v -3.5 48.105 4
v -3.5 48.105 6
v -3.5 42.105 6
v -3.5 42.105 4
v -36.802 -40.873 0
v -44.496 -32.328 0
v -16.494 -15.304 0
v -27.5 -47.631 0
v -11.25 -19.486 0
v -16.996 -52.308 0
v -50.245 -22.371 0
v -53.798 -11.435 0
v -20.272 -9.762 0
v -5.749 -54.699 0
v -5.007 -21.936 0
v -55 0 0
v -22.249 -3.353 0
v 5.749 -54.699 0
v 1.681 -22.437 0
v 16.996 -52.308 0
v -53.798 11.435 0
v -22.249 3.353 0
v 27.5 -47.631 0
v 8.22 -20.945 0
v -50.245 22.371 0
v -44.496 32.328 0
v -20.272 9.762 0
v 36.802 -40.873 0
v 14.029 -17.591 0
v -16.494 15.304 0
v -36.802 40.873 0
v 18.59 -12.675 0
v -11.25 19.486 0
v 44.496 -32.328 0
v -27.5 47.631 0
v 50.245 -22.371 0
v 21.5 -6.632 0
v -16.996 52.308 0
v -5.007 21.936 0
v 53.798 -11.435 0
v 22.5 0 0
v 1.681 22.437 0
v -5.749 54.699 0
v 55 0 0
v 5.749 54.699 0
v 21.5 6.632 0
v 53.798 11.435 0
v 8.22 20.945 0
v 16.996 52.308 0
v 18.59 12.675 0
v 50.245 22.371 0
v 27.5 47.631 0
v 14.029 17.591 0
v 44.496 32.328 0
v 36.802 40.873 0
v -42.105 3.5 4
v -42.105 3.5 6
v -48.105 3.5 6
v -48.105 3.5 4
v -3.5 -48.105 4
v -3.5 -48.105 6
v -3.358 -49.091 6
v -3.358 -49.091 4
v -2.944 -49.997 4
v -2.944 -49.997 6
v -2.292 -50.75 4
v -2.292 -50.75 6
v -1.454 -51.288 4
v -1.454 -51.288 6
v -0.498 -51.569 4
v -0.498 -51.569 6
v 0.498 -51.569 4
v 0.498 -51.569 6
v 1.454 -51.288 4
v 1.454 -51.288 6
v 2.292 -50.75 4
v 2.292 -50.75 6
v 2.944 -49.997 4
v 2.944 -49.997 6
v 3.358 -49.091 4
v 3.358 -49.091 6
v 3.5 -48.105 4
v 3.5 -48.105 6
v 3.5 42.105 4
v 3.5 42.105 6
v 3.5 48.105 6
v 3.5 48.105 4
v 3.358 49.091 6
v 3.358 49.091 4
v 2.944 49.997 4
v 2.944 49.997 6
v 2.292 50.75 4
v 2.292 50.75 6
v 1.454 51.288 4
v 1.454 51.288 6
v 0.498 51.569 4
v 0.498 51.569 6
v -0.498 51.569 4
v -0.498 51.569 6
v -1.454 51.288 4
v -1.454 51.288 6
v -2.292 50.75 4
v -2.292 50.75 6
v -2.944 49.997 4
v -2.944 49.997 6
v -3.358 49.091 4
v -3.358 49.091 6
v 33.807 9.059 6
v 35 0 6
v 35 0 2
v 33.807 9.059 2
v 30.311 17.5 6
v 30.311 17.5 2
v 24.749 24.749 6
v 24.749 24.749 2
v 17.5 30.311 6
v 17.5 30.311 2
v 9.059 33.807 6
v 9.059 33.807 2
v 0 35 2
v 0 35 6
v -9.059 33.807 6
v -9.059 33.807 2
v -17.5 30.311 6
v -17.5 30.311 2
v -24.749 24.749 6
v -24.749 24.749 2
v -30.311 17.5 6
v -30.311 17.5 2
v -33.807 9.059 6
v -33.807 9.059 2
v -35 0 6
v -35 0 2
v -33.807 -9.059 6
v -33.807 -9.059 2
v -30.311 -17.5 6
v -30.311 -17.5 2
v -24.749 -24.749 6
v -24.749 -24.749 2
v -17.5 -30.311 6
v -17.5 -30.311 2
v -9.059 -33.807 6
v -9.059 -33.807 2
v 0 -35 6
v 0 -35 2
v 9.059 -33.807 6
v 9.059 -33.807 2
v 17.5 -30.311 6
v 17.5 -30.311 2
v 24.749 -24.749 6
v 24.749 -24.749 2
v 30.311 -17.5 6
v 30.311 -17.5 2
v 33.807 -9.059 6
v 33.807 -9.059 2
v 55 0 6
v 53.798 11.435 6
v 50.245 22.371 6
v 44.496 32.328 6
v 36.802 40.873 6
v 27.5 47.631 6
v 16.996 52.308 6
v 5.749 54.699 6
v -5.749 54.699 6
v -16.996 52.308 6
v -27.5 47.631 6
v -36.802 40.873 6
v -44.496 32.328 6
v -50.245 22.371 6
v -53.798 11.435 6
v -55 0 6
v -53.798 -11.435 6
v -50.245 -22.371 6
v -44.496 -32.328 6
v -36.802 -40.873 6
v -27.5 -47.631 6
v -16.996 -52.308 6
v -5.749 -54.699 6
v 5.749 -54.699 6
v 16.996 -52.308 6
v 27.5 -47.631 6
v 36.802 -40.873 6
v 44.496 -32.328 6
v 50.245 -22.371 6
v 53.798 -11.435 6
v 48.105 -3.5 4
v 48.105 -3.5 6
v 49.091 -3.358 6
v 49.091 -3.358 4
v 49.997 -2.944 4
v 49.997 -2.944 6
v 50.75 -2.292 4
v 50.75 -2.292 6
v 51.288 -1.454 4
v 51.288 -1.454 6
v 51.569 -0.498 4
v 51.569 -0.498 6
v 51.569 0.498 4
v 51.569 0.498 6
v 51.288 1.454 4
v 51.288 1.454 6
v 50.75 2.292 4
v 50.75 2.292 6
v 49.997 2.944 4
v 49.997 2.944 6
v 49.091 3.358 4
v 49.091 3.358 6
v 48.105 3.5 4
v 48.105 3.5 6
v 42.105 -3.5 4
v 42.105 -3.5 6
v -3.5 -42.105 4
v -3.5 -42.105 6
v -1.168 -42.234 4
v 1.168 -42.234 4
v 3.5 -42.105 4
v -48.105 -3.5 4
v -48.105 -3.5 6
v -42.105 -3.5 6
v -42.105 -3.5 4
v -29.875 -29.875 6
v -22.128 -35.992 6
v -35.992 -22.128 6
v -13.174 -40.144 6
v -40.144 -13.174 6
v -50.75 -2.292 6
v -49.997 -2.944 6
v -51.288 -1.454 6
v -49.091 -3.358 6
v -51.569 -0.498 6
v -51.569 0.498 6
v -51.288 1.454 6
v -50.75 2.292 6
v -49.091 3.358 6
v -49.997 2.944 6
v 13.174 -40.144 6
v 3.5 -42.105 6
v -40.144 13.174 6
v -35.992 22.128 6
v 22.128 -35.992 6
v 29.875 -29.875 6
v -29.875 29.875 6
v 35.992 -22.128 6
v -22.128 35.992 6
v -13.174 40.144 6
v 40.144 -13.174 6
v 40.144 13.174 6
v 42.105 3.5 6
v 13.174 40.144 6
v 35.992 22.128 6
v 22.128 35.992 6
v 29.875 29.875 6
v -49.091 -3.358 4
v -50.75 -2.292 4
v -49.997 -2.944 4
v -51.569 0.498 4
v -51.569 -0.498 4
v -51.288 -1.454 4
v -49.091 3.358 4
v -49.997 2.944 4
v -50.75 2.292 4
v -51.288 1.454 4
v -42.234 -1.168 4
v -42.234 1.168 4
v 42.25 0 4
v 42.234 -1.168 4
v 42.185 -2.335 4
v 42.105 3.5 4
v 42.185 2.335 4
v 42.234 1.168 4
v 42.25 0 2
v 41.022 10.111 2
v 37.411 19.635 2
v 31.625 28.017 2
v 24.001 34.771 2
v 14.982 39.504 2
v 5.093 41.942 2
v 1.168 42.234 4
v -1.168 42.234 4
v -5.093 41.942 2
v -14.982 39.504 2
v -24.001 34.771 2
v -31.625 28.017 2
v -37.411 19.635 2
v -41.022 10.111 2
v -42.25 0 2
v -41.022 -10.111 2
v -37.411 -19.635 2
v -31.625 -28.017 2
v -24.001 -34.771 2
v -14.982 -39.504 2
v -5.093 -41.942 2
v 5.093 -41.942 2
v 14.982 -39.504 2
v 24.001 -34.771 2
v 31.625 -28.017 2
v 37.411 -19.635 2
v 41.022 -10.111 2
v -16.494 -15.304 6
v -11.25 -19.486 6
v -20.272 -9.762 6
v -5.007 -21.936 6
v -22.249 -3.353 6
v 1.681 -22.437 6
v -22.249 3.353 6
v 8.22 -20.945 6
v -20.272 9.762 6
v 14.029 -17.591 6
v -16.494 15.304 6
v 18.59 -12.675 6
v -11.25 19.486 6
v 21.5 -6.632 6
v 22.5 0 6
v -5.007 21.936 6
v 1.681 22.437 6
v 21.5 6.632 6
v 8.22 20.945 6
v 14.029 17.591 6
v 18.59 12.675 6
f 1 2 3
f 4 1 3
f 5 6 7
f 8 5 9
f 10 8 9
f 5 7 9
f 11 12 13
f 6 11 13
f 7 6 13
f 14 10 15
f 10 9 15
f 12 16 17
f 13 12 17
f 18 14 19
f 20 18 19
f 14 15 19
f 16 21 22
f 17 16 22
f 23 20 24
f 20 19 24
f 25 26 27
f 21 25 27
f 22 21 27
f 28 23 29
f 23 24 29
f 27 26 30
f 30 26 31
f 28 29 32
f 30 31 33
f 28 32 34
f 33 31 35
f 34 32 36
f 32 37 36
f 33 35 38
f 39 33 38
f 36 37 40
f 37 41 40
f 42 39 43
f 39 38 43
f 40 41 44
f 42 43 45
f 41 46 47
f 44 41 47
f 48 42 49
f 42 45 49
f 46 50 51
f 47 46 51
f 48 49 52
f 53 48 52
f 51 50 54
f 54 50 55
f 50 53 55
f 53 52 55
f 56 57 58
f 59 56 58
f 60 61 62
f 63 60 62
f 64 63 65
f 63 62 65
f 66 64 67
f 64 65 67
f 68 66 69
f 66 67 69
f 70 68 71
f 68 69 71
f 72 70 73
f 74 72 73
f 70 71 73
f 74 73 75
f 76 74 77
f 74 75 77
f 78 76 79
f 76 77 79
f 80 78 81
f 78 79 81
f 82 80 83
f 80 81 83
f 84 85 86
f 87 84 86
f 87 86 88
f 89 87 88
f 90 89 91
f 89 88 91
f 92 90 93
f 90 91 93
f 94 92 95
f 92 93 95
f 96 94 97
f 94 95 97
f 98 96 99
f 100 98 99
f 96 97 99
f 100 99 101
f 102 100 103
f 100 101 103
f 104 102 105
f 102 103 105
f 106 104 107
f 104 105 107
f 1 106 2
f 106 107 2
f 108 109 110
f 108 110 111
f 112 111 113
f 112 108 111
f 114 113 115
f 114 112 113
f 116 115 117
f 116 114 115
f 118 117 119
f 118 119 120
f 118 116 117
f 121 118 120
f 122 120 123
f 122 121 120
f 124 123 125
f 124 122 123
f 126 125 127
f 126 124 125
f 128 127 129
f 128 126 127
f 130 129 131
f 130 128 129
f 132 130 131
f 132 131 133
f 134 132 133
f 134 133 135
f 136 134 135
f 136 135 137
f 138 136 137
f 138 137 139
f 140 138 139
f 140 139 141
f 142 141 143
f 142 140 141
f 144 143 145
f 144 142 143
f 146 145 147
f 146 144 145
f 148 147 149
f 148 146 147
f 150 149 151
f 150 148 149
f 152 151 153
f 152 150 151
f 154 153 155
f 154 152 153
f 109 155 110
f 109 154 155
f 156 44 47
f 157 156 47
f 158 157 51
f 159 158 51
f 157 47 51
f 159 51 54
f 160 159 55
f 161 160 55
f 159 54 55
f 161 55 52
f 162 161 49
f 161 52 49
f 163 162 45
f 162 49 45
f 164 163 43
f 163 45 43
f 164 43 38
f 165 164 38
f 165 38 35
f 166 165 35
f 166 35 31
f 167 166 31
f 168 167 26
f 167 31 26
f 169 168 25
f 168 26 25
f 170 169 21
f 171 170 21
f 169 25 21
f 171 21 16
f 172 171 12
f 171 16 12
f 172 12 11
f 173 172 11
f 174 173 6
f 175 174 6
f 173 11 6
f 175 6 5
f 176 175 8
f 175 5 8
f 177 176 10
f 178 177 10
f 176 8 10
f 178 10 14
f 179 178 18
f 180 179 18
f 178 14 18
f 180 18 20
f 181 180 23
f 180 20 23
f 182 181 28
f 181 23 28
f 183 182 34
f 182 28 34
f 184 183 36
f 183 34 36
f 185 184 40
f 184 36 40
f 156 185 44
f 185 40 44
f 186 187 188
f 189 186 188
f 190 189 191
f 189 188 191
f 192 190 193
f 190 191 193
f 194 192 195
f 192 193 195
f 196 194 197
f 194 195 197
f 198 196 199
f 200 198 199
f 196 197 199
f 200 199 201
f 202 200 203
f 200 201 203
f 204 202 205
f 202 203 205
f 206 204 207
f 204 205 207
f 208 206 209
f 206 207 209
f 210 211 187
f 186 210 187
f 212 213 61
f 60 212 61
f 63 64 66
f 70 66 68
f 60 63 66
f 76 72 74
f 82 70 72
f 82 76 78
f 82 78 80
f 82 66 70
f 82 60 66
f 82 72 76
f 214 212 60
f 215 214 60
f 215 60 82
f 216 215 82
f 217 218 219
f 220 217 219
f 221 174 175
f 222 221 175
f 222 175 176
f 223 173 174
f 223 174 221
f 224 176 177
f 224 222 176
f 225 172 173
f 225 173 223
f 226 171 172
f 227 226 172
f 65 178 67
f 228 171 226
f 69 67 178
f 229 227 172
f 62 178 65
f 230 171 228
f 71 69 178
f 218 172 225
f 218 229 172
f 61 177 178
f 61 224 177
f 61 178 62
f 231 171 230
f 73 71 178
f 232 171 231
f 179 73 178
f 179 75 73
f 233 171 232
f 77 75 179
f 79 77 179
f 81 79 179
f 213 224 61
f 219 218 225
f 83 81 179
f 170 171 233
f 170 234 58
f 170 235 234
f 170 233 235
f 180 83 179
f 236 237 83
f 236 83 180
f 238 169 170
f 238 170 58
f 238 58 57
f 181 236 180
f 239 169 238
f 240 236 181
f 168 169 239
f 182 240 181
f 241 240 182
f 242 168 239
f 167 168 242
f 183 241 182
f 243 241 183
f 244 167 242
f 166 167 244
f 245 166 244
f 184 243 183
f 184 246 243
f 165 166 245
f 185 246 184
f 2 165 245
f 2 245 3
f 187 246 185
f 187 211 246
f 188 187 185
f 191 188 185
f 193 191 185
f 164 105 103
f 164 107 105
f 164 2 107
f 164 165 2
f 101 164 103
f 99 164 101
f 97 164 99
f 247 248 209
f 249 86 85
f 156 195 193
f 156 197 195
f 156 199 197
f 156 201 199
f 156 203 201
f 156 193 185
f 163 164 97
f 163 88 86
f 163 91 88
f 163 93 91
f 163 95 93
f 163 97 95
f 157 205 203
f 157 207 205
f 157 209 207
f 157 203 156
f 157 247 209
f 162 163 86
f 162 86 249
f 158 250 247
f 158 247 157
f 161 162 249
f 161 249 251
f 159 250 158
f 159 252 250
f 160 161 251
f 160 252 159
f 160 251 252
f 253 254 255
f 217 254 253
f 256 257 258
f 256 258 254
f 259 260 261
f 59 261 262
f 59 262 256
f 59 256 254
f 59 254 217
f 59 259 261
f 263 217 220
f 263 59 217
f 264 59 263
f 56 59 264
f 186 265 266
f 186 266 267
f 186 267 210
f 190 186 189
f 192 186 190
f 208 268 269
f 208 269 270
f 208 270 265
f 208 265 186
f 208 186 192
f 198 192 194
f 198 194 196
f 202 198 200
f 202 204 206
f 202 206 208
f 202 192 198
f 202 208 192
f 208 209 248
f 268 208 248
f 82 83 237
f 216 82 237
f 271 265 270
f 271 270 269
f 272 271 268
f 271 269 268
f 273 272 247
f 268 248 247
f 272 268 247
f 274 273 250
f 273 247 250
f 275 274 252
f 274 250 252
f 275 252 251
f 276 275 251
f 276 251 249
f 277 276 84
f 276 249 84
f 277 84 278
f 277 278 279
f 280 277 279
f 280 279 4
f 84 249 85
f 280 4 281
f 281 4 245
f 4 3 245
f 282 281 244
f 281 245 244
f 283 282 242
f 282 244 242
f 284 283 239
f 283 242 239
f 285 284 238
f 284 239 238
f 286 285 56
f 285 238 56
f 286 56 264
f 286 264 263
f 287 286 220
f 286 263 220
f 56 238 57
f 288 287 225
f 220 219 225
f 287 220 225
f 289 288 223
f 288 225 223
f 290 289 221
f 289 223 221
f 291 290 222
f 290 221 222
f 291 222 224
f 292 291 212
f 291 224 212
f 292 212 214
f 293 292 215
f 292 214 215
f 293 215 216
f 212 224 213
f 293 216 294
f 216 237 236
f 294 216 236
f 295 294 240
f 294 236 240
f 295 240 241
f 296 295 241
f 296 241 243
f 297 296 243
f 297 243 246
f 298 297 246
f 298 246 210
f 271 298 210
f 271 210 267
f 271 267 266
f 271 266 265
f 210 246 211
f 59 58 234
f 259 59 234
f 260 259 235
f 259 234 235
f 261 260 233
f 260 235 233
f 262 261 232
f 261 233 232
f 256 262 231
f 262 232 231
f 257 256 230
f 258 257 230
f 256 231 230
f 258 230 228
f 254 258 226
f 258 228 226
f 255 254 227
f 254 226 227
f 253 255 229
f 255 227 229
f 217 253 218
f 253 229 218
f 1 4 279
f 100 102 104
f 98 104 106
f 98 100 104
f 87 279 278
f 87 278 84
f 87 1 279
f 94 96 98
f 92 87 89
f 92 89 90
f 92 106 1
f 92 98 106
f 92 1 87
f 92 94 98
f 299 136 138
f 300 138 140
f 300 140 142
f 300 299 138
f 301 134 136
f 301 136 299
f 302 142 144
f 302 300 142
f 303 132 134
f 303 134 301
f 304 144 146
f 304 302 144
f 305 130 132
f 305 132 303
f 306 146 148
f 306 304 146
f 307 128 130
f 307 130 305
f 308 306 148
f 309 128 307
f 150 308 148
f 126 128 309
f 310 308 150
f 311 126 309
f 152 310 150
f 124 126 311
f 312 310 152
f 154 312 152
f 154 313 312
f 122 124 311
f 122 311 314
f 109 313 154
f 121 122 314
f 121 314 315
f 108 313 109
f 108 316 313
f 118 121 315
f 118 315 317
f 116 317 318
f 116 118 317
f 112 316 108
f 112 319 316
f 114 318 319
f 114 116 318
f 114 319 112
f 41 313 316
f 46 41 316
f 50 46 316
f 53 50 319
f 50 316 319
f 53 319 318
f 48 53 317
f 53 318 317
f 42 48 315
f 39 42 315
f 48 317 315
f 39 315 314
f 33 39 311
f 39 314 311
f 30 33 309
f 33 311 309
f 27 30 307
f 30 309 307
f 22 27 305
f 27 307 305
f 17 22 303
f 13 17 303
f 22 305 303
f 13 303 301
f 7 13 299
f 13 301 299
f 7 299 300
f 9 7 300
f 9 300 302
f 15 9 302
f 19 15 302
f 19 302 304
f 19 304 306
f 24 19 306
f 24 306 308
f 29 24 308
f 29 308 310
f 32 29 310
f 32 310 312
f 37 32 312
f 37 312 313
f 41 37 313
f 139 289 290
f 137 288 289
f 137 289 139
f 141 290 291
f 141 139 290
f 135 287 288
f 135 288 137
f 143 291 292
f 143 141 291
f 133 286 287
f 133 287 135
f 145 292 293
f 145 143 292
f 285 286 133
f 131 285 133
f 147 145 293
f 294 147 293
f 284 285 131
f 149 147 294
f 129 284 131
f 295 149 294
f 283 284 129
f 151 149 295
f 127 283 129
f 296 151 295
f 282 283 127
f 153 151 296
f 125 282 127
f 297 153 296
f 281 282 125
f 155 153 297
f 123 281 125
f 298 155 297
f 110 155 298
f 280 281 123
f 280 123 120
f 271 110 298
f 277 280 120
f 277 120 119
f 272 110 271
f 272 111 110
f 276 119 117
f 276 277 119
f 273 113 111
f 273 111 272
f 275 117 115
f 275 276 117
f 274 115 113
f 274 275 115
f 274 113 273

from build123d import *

# Parameters (mm, degrees)
F0_R     = 55
F1_DEPTH = 6
F2_R     = 42.25
F2_R_2   = 35
F3_DEPTH = 4
F5_DEPTH = 2
F6_R     = 22.5
F7_DEPTH = 6.001


with BuildPart() as f1:
    # F0 (on Top) → F1 (new body)
    with BuildSketch(Plane.XY):
        Circle(F0_R)
    extrude(amount=F1_DEPTH)

    # F2 (on face) → F3 (cut)
    with BuildSketch(Plane.XY.offset(6)):
        Circle(F2_R)
        Circle(F2_R_2, mode=Mode.SUBTRACT)
    extrude(amount=-F3_DEPTH, mode=Mode.SUBTRACT)

    # F4 (on face) → F5 (cut)
    with BuildSketch(Plane.XY.offset(6)):
        with BuildLine():
            Line((-3.5, 48.10478), (-3.5, 42.10478))
            ThreePointArc((-3.5, 42.10478), (0, 42.25), (3.5, 42.10478))
            Line((3.5, 42.10478), (3.5, 48.10478))
            ThreePointArc((3.5, 48.10478), (0, 51.60478), (-3.5, 48.10478))
        make_face()
        with BuildLine():
            Line((-48.10478, -3.5), (-42.10478, -3.5))
            ThreePointArc((-42.10478, -3.5), (-42.25, 0), (-42.10478, 3.5))
            Line((-42.10478, 3.5), (-48.10478, 3.5))
            ThreePointArc((-48.10478, 3.5), (-51.60478, 0), (-48.10478, -3.5))
        make_face()
        with BuildLine():
            Line((3.5, -48.10478), (3.5, -42.10478))
            ThreePointArc((3.5, -42.10478), (0, -42.25), (-3.5, -42.10478))
            Line((-3.5, -42.10478), (-3.5, -48.10478))
            ThreePointArc((-3.5, -48.10478), (0, -51.60478), (3.5, -48.10478))
        make_face()
        with BuildLine():
            Line((48.10478, 3.5), (42.10478, 3.5))
            ThreePointArc((42.10478, 3.5), (42.25, 0), (42.10478, -3.5))
            Line((42.10478, -3.5), (48.10478, -3.5))
            ThreePointArc((48.10478, -3.5), (51.60478, 0), (48.10478, 3.5))
        make_face()
    extrude(amount=-F5_DEPTH, mode=Mode.SUBTRACT)

    # F6 (on face) → F7 (cut, through all)
    with BuildSketch(Plane.XY.offset(6)):
        Circle(F6_R)
    extrude(amount=-F7_DEPTH, mode=Mode.SUBTRACT)


solid = f1.part
